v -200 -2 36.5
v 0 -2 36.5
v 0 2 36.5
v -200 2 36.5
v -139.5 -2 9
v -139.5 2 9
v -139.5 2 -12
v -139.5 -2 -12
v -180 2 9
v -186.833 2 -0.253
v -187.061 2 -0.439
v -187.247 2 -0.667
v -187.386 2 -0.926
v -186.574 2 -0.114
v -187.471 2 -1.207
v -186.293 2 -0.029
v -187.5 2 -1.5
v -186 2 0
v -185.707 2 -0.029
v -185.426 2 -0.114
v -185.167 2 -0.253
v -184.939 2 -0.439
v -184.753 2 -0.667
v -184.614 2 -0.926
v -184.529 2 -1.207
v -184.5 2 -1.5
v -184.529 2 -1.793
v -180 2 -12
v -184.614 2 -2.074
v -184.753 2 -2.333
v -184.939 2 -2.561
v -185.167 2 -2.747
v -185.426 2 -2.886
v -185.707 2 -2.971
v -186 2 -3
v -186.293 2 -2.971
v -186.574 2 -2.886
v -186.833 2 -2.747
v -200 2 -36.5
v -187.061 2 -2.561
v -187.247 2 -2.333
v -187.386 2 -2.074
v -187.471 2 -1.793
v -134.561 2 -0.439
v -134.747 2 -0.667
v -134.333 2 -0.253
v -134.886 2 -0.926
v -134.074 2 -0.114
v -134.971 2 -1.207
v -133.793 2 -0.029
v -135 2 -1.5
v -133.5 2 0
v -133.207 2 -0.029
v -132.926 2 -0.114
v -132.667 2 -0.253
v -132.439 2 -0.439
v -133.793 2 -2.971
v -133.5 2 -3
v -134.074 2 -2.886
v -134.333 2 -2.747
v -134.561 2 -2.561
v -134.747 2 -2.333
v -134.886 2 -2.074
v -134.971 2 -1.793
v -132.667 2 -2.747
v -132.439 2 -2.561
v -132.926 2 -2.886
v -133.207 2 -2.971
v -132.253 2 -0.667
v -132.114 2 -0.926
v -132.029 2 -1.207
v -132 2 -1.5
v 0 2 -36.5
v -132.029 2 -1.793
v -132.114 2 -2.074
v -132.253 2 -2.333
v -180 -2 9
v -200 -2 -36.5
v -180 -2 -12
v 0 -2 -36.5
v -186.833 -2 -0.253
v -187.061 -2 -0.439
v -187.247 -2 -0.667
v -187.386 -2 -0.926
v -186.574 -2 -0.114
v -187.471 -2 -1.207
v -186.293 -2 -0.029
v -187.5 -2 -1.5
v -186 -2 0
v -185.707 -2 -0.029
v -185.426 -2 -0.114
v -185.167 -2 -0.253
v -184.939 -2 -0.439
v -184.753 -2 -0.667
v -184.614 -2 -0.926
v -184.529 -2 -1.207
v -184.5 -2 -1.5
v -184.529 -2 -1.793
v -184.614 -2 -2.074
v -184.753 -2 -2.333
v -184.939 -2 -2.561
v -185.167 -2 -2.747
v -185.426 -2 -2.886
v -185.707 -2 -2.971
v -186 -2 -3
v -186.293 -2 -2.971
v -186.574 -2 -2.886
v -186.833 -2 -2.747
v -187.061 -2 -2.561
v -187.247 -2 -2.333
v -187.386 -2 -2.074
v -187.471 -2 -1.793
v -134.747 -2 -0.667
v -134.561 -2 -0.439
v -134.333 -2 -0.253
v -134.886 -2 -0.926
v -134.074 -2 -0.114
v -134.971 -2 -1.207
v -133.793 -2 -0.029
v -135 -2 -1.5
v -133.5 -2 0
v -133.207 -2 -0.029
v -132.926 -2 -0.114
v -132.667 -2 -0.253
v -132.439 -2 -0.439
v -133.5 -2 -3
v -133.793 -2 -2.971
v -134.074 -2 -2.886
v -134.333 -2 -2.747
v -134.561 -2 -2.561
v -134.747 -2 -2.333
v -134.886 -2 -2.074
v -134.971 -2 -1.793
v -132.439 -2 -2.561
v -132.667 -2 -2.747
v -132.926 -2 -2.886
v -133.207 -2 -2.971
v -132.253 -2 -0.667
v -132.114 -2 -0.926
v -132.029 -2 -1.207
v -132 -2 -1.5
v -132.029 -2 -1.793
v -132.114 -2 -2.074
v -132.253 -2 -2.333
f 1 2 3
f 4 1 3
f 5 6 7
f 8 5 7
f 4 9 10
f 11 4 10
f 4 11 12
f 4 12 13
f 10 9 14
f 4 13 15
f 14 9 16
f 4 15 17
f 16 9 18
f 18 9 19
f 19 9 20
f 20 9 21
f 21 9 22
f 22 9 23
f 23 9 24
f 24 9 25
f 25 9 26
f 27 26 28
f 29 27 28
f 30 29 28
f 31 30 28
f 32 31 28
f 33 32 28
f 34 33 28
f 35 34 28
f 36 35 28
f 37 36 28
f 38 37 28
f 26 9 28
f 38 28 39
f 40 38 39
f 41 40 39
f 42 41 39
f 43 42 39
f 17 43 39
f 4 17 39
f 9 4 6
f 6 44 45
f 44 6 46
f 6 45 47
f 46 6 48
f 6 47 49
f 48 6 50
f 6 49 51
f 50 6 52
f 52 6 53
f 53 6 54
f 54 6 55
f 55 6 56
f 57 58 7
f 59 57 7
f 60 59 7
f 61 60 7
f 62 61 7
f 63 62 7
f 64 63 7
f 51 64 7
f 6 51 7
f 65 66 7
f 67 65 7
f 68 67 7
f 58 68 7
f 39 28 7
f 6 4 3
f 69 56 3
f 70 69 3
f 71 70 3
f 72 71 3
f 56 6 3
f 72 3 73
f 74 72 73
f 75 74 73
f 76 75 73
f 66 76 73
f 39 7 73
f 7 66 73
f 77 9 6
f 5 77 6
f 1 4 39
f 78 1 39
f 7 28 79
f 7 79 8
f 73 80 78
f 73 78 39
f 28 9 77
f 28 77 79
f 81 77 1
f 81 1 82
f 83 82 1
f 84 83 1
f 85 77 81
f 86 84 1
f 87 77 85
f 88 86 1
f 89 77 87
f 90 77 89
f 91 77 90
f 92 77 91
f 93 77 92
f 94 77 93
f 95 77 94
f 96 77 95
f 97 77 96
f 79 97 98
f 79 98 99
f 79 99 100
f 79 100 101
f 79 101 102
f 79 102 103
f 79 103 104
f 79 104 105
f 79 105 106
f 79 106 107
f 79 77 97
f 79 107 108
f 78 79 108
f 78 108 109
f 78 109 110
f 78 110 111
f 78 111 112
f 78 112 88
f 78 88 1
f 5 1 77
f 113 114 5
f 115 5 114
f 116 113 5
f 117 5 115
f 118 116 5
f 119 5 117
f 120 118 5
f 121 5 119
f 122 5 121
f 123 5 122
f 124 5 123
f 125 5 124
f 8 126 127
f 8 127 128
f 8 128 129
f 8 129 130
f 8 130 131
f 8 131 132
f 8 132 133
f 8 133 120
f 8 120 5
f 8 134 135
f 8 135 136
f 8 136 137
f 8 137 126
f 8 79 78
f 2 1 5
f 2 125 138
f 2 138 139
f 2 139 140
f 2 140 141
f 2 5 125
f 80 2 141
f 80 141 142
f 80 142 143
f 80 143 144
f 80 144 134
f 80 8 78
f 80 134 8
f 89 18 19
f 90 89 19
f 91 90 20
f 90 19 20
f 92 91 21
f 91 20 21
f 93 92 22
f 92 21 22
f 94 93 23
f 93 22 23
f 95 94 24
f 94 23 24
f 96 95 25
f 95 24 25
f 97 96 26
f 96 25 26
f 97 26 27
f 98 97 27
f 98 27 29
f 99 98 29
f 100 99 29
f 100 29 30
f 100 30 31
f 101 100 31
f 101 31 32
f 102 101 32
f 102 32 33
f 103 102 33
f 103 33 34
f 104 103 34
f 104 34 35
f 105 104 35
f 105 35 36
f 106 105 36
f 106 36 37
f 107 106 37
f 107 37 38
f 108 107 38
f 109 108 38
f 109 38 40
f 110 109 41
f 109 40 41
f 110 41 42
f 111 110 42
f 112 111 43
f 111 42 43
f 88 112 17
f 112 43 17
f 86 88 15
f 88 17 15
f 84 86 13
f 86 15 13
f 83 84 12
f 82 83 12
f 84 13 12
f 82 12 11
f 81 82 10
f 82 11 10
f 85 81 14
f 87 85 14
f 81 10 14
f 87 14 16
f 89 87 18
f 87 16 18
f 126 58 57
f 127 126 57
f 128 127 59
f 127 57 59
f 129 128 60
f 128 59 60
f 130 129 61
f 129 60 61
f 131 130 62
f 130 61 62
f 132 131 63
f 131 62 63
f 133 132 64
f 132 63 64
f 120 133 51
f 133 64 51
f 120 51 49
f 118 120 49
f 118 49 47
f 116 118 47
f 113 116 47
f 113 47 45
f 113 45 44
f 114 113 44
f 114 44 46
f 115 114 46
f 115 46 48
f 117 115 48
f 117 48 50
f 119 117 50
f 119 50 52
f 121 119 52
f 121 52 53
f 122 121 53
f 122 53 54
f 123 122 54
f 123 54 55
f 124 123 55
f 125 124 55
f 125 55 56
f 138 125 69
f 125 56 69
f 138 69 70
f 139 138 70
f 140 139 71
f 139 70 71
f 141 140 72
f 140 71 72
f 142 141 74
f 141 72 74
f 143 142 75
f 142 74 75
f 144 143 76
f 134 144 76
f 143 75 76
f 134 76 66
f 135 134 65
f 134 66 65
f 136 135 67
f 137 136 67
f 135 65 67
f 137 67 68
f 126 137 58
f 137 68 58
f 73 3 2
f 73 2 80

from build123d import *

# Parameters (mm, degrees)
SKETCH1_W           = 73
SKETCH1_H           = 4
BOSS_EXTRUDE1_DEPTH = 200
SKETCH2_R           = 1.5
SKETCH2_W           = 40.5
SKETCH2_H           = 21
CUT_EXTRUDE1_DEPTH  = 2000


with BuildPart() as part:
    # Sketch1 → Boss-Extrude1 (new body)
    with BuildSketch(Plane(origin=(0, 0, 0), x_dir=(0, 0, -1), z_dir=(1, 0, 0))):
        Rectangle(SKETCH1_W, SKETCH1_H)
    extrude(amount=-BOSS_EXTRUDE1_DEPTH)

    # Sketch2 → Cut-Extrude1 (cut)
    with BuildSketch(Plane(origin=(0, 2, 0), x_dir=(1, 0, 0), z_dir=(0, 1, 0))):
        with Locations(Location((-186, 1.5, 0), (0, 0, 270))):
            Circle(SKETCH2_R)
        with Locations(Location((-133.5, 1.5, 0), (0, 0, 90))):
            Circle(SKETCH2_R)
        with Locations((-159.75, 1.5)):
            Rectangle(SKETCH2_W, SKETCH2_H)
    extrude(amount=-CUT_EXTRUDE1_DEPTH, mode=Mode.SUBTRACT)


solid = part.part
